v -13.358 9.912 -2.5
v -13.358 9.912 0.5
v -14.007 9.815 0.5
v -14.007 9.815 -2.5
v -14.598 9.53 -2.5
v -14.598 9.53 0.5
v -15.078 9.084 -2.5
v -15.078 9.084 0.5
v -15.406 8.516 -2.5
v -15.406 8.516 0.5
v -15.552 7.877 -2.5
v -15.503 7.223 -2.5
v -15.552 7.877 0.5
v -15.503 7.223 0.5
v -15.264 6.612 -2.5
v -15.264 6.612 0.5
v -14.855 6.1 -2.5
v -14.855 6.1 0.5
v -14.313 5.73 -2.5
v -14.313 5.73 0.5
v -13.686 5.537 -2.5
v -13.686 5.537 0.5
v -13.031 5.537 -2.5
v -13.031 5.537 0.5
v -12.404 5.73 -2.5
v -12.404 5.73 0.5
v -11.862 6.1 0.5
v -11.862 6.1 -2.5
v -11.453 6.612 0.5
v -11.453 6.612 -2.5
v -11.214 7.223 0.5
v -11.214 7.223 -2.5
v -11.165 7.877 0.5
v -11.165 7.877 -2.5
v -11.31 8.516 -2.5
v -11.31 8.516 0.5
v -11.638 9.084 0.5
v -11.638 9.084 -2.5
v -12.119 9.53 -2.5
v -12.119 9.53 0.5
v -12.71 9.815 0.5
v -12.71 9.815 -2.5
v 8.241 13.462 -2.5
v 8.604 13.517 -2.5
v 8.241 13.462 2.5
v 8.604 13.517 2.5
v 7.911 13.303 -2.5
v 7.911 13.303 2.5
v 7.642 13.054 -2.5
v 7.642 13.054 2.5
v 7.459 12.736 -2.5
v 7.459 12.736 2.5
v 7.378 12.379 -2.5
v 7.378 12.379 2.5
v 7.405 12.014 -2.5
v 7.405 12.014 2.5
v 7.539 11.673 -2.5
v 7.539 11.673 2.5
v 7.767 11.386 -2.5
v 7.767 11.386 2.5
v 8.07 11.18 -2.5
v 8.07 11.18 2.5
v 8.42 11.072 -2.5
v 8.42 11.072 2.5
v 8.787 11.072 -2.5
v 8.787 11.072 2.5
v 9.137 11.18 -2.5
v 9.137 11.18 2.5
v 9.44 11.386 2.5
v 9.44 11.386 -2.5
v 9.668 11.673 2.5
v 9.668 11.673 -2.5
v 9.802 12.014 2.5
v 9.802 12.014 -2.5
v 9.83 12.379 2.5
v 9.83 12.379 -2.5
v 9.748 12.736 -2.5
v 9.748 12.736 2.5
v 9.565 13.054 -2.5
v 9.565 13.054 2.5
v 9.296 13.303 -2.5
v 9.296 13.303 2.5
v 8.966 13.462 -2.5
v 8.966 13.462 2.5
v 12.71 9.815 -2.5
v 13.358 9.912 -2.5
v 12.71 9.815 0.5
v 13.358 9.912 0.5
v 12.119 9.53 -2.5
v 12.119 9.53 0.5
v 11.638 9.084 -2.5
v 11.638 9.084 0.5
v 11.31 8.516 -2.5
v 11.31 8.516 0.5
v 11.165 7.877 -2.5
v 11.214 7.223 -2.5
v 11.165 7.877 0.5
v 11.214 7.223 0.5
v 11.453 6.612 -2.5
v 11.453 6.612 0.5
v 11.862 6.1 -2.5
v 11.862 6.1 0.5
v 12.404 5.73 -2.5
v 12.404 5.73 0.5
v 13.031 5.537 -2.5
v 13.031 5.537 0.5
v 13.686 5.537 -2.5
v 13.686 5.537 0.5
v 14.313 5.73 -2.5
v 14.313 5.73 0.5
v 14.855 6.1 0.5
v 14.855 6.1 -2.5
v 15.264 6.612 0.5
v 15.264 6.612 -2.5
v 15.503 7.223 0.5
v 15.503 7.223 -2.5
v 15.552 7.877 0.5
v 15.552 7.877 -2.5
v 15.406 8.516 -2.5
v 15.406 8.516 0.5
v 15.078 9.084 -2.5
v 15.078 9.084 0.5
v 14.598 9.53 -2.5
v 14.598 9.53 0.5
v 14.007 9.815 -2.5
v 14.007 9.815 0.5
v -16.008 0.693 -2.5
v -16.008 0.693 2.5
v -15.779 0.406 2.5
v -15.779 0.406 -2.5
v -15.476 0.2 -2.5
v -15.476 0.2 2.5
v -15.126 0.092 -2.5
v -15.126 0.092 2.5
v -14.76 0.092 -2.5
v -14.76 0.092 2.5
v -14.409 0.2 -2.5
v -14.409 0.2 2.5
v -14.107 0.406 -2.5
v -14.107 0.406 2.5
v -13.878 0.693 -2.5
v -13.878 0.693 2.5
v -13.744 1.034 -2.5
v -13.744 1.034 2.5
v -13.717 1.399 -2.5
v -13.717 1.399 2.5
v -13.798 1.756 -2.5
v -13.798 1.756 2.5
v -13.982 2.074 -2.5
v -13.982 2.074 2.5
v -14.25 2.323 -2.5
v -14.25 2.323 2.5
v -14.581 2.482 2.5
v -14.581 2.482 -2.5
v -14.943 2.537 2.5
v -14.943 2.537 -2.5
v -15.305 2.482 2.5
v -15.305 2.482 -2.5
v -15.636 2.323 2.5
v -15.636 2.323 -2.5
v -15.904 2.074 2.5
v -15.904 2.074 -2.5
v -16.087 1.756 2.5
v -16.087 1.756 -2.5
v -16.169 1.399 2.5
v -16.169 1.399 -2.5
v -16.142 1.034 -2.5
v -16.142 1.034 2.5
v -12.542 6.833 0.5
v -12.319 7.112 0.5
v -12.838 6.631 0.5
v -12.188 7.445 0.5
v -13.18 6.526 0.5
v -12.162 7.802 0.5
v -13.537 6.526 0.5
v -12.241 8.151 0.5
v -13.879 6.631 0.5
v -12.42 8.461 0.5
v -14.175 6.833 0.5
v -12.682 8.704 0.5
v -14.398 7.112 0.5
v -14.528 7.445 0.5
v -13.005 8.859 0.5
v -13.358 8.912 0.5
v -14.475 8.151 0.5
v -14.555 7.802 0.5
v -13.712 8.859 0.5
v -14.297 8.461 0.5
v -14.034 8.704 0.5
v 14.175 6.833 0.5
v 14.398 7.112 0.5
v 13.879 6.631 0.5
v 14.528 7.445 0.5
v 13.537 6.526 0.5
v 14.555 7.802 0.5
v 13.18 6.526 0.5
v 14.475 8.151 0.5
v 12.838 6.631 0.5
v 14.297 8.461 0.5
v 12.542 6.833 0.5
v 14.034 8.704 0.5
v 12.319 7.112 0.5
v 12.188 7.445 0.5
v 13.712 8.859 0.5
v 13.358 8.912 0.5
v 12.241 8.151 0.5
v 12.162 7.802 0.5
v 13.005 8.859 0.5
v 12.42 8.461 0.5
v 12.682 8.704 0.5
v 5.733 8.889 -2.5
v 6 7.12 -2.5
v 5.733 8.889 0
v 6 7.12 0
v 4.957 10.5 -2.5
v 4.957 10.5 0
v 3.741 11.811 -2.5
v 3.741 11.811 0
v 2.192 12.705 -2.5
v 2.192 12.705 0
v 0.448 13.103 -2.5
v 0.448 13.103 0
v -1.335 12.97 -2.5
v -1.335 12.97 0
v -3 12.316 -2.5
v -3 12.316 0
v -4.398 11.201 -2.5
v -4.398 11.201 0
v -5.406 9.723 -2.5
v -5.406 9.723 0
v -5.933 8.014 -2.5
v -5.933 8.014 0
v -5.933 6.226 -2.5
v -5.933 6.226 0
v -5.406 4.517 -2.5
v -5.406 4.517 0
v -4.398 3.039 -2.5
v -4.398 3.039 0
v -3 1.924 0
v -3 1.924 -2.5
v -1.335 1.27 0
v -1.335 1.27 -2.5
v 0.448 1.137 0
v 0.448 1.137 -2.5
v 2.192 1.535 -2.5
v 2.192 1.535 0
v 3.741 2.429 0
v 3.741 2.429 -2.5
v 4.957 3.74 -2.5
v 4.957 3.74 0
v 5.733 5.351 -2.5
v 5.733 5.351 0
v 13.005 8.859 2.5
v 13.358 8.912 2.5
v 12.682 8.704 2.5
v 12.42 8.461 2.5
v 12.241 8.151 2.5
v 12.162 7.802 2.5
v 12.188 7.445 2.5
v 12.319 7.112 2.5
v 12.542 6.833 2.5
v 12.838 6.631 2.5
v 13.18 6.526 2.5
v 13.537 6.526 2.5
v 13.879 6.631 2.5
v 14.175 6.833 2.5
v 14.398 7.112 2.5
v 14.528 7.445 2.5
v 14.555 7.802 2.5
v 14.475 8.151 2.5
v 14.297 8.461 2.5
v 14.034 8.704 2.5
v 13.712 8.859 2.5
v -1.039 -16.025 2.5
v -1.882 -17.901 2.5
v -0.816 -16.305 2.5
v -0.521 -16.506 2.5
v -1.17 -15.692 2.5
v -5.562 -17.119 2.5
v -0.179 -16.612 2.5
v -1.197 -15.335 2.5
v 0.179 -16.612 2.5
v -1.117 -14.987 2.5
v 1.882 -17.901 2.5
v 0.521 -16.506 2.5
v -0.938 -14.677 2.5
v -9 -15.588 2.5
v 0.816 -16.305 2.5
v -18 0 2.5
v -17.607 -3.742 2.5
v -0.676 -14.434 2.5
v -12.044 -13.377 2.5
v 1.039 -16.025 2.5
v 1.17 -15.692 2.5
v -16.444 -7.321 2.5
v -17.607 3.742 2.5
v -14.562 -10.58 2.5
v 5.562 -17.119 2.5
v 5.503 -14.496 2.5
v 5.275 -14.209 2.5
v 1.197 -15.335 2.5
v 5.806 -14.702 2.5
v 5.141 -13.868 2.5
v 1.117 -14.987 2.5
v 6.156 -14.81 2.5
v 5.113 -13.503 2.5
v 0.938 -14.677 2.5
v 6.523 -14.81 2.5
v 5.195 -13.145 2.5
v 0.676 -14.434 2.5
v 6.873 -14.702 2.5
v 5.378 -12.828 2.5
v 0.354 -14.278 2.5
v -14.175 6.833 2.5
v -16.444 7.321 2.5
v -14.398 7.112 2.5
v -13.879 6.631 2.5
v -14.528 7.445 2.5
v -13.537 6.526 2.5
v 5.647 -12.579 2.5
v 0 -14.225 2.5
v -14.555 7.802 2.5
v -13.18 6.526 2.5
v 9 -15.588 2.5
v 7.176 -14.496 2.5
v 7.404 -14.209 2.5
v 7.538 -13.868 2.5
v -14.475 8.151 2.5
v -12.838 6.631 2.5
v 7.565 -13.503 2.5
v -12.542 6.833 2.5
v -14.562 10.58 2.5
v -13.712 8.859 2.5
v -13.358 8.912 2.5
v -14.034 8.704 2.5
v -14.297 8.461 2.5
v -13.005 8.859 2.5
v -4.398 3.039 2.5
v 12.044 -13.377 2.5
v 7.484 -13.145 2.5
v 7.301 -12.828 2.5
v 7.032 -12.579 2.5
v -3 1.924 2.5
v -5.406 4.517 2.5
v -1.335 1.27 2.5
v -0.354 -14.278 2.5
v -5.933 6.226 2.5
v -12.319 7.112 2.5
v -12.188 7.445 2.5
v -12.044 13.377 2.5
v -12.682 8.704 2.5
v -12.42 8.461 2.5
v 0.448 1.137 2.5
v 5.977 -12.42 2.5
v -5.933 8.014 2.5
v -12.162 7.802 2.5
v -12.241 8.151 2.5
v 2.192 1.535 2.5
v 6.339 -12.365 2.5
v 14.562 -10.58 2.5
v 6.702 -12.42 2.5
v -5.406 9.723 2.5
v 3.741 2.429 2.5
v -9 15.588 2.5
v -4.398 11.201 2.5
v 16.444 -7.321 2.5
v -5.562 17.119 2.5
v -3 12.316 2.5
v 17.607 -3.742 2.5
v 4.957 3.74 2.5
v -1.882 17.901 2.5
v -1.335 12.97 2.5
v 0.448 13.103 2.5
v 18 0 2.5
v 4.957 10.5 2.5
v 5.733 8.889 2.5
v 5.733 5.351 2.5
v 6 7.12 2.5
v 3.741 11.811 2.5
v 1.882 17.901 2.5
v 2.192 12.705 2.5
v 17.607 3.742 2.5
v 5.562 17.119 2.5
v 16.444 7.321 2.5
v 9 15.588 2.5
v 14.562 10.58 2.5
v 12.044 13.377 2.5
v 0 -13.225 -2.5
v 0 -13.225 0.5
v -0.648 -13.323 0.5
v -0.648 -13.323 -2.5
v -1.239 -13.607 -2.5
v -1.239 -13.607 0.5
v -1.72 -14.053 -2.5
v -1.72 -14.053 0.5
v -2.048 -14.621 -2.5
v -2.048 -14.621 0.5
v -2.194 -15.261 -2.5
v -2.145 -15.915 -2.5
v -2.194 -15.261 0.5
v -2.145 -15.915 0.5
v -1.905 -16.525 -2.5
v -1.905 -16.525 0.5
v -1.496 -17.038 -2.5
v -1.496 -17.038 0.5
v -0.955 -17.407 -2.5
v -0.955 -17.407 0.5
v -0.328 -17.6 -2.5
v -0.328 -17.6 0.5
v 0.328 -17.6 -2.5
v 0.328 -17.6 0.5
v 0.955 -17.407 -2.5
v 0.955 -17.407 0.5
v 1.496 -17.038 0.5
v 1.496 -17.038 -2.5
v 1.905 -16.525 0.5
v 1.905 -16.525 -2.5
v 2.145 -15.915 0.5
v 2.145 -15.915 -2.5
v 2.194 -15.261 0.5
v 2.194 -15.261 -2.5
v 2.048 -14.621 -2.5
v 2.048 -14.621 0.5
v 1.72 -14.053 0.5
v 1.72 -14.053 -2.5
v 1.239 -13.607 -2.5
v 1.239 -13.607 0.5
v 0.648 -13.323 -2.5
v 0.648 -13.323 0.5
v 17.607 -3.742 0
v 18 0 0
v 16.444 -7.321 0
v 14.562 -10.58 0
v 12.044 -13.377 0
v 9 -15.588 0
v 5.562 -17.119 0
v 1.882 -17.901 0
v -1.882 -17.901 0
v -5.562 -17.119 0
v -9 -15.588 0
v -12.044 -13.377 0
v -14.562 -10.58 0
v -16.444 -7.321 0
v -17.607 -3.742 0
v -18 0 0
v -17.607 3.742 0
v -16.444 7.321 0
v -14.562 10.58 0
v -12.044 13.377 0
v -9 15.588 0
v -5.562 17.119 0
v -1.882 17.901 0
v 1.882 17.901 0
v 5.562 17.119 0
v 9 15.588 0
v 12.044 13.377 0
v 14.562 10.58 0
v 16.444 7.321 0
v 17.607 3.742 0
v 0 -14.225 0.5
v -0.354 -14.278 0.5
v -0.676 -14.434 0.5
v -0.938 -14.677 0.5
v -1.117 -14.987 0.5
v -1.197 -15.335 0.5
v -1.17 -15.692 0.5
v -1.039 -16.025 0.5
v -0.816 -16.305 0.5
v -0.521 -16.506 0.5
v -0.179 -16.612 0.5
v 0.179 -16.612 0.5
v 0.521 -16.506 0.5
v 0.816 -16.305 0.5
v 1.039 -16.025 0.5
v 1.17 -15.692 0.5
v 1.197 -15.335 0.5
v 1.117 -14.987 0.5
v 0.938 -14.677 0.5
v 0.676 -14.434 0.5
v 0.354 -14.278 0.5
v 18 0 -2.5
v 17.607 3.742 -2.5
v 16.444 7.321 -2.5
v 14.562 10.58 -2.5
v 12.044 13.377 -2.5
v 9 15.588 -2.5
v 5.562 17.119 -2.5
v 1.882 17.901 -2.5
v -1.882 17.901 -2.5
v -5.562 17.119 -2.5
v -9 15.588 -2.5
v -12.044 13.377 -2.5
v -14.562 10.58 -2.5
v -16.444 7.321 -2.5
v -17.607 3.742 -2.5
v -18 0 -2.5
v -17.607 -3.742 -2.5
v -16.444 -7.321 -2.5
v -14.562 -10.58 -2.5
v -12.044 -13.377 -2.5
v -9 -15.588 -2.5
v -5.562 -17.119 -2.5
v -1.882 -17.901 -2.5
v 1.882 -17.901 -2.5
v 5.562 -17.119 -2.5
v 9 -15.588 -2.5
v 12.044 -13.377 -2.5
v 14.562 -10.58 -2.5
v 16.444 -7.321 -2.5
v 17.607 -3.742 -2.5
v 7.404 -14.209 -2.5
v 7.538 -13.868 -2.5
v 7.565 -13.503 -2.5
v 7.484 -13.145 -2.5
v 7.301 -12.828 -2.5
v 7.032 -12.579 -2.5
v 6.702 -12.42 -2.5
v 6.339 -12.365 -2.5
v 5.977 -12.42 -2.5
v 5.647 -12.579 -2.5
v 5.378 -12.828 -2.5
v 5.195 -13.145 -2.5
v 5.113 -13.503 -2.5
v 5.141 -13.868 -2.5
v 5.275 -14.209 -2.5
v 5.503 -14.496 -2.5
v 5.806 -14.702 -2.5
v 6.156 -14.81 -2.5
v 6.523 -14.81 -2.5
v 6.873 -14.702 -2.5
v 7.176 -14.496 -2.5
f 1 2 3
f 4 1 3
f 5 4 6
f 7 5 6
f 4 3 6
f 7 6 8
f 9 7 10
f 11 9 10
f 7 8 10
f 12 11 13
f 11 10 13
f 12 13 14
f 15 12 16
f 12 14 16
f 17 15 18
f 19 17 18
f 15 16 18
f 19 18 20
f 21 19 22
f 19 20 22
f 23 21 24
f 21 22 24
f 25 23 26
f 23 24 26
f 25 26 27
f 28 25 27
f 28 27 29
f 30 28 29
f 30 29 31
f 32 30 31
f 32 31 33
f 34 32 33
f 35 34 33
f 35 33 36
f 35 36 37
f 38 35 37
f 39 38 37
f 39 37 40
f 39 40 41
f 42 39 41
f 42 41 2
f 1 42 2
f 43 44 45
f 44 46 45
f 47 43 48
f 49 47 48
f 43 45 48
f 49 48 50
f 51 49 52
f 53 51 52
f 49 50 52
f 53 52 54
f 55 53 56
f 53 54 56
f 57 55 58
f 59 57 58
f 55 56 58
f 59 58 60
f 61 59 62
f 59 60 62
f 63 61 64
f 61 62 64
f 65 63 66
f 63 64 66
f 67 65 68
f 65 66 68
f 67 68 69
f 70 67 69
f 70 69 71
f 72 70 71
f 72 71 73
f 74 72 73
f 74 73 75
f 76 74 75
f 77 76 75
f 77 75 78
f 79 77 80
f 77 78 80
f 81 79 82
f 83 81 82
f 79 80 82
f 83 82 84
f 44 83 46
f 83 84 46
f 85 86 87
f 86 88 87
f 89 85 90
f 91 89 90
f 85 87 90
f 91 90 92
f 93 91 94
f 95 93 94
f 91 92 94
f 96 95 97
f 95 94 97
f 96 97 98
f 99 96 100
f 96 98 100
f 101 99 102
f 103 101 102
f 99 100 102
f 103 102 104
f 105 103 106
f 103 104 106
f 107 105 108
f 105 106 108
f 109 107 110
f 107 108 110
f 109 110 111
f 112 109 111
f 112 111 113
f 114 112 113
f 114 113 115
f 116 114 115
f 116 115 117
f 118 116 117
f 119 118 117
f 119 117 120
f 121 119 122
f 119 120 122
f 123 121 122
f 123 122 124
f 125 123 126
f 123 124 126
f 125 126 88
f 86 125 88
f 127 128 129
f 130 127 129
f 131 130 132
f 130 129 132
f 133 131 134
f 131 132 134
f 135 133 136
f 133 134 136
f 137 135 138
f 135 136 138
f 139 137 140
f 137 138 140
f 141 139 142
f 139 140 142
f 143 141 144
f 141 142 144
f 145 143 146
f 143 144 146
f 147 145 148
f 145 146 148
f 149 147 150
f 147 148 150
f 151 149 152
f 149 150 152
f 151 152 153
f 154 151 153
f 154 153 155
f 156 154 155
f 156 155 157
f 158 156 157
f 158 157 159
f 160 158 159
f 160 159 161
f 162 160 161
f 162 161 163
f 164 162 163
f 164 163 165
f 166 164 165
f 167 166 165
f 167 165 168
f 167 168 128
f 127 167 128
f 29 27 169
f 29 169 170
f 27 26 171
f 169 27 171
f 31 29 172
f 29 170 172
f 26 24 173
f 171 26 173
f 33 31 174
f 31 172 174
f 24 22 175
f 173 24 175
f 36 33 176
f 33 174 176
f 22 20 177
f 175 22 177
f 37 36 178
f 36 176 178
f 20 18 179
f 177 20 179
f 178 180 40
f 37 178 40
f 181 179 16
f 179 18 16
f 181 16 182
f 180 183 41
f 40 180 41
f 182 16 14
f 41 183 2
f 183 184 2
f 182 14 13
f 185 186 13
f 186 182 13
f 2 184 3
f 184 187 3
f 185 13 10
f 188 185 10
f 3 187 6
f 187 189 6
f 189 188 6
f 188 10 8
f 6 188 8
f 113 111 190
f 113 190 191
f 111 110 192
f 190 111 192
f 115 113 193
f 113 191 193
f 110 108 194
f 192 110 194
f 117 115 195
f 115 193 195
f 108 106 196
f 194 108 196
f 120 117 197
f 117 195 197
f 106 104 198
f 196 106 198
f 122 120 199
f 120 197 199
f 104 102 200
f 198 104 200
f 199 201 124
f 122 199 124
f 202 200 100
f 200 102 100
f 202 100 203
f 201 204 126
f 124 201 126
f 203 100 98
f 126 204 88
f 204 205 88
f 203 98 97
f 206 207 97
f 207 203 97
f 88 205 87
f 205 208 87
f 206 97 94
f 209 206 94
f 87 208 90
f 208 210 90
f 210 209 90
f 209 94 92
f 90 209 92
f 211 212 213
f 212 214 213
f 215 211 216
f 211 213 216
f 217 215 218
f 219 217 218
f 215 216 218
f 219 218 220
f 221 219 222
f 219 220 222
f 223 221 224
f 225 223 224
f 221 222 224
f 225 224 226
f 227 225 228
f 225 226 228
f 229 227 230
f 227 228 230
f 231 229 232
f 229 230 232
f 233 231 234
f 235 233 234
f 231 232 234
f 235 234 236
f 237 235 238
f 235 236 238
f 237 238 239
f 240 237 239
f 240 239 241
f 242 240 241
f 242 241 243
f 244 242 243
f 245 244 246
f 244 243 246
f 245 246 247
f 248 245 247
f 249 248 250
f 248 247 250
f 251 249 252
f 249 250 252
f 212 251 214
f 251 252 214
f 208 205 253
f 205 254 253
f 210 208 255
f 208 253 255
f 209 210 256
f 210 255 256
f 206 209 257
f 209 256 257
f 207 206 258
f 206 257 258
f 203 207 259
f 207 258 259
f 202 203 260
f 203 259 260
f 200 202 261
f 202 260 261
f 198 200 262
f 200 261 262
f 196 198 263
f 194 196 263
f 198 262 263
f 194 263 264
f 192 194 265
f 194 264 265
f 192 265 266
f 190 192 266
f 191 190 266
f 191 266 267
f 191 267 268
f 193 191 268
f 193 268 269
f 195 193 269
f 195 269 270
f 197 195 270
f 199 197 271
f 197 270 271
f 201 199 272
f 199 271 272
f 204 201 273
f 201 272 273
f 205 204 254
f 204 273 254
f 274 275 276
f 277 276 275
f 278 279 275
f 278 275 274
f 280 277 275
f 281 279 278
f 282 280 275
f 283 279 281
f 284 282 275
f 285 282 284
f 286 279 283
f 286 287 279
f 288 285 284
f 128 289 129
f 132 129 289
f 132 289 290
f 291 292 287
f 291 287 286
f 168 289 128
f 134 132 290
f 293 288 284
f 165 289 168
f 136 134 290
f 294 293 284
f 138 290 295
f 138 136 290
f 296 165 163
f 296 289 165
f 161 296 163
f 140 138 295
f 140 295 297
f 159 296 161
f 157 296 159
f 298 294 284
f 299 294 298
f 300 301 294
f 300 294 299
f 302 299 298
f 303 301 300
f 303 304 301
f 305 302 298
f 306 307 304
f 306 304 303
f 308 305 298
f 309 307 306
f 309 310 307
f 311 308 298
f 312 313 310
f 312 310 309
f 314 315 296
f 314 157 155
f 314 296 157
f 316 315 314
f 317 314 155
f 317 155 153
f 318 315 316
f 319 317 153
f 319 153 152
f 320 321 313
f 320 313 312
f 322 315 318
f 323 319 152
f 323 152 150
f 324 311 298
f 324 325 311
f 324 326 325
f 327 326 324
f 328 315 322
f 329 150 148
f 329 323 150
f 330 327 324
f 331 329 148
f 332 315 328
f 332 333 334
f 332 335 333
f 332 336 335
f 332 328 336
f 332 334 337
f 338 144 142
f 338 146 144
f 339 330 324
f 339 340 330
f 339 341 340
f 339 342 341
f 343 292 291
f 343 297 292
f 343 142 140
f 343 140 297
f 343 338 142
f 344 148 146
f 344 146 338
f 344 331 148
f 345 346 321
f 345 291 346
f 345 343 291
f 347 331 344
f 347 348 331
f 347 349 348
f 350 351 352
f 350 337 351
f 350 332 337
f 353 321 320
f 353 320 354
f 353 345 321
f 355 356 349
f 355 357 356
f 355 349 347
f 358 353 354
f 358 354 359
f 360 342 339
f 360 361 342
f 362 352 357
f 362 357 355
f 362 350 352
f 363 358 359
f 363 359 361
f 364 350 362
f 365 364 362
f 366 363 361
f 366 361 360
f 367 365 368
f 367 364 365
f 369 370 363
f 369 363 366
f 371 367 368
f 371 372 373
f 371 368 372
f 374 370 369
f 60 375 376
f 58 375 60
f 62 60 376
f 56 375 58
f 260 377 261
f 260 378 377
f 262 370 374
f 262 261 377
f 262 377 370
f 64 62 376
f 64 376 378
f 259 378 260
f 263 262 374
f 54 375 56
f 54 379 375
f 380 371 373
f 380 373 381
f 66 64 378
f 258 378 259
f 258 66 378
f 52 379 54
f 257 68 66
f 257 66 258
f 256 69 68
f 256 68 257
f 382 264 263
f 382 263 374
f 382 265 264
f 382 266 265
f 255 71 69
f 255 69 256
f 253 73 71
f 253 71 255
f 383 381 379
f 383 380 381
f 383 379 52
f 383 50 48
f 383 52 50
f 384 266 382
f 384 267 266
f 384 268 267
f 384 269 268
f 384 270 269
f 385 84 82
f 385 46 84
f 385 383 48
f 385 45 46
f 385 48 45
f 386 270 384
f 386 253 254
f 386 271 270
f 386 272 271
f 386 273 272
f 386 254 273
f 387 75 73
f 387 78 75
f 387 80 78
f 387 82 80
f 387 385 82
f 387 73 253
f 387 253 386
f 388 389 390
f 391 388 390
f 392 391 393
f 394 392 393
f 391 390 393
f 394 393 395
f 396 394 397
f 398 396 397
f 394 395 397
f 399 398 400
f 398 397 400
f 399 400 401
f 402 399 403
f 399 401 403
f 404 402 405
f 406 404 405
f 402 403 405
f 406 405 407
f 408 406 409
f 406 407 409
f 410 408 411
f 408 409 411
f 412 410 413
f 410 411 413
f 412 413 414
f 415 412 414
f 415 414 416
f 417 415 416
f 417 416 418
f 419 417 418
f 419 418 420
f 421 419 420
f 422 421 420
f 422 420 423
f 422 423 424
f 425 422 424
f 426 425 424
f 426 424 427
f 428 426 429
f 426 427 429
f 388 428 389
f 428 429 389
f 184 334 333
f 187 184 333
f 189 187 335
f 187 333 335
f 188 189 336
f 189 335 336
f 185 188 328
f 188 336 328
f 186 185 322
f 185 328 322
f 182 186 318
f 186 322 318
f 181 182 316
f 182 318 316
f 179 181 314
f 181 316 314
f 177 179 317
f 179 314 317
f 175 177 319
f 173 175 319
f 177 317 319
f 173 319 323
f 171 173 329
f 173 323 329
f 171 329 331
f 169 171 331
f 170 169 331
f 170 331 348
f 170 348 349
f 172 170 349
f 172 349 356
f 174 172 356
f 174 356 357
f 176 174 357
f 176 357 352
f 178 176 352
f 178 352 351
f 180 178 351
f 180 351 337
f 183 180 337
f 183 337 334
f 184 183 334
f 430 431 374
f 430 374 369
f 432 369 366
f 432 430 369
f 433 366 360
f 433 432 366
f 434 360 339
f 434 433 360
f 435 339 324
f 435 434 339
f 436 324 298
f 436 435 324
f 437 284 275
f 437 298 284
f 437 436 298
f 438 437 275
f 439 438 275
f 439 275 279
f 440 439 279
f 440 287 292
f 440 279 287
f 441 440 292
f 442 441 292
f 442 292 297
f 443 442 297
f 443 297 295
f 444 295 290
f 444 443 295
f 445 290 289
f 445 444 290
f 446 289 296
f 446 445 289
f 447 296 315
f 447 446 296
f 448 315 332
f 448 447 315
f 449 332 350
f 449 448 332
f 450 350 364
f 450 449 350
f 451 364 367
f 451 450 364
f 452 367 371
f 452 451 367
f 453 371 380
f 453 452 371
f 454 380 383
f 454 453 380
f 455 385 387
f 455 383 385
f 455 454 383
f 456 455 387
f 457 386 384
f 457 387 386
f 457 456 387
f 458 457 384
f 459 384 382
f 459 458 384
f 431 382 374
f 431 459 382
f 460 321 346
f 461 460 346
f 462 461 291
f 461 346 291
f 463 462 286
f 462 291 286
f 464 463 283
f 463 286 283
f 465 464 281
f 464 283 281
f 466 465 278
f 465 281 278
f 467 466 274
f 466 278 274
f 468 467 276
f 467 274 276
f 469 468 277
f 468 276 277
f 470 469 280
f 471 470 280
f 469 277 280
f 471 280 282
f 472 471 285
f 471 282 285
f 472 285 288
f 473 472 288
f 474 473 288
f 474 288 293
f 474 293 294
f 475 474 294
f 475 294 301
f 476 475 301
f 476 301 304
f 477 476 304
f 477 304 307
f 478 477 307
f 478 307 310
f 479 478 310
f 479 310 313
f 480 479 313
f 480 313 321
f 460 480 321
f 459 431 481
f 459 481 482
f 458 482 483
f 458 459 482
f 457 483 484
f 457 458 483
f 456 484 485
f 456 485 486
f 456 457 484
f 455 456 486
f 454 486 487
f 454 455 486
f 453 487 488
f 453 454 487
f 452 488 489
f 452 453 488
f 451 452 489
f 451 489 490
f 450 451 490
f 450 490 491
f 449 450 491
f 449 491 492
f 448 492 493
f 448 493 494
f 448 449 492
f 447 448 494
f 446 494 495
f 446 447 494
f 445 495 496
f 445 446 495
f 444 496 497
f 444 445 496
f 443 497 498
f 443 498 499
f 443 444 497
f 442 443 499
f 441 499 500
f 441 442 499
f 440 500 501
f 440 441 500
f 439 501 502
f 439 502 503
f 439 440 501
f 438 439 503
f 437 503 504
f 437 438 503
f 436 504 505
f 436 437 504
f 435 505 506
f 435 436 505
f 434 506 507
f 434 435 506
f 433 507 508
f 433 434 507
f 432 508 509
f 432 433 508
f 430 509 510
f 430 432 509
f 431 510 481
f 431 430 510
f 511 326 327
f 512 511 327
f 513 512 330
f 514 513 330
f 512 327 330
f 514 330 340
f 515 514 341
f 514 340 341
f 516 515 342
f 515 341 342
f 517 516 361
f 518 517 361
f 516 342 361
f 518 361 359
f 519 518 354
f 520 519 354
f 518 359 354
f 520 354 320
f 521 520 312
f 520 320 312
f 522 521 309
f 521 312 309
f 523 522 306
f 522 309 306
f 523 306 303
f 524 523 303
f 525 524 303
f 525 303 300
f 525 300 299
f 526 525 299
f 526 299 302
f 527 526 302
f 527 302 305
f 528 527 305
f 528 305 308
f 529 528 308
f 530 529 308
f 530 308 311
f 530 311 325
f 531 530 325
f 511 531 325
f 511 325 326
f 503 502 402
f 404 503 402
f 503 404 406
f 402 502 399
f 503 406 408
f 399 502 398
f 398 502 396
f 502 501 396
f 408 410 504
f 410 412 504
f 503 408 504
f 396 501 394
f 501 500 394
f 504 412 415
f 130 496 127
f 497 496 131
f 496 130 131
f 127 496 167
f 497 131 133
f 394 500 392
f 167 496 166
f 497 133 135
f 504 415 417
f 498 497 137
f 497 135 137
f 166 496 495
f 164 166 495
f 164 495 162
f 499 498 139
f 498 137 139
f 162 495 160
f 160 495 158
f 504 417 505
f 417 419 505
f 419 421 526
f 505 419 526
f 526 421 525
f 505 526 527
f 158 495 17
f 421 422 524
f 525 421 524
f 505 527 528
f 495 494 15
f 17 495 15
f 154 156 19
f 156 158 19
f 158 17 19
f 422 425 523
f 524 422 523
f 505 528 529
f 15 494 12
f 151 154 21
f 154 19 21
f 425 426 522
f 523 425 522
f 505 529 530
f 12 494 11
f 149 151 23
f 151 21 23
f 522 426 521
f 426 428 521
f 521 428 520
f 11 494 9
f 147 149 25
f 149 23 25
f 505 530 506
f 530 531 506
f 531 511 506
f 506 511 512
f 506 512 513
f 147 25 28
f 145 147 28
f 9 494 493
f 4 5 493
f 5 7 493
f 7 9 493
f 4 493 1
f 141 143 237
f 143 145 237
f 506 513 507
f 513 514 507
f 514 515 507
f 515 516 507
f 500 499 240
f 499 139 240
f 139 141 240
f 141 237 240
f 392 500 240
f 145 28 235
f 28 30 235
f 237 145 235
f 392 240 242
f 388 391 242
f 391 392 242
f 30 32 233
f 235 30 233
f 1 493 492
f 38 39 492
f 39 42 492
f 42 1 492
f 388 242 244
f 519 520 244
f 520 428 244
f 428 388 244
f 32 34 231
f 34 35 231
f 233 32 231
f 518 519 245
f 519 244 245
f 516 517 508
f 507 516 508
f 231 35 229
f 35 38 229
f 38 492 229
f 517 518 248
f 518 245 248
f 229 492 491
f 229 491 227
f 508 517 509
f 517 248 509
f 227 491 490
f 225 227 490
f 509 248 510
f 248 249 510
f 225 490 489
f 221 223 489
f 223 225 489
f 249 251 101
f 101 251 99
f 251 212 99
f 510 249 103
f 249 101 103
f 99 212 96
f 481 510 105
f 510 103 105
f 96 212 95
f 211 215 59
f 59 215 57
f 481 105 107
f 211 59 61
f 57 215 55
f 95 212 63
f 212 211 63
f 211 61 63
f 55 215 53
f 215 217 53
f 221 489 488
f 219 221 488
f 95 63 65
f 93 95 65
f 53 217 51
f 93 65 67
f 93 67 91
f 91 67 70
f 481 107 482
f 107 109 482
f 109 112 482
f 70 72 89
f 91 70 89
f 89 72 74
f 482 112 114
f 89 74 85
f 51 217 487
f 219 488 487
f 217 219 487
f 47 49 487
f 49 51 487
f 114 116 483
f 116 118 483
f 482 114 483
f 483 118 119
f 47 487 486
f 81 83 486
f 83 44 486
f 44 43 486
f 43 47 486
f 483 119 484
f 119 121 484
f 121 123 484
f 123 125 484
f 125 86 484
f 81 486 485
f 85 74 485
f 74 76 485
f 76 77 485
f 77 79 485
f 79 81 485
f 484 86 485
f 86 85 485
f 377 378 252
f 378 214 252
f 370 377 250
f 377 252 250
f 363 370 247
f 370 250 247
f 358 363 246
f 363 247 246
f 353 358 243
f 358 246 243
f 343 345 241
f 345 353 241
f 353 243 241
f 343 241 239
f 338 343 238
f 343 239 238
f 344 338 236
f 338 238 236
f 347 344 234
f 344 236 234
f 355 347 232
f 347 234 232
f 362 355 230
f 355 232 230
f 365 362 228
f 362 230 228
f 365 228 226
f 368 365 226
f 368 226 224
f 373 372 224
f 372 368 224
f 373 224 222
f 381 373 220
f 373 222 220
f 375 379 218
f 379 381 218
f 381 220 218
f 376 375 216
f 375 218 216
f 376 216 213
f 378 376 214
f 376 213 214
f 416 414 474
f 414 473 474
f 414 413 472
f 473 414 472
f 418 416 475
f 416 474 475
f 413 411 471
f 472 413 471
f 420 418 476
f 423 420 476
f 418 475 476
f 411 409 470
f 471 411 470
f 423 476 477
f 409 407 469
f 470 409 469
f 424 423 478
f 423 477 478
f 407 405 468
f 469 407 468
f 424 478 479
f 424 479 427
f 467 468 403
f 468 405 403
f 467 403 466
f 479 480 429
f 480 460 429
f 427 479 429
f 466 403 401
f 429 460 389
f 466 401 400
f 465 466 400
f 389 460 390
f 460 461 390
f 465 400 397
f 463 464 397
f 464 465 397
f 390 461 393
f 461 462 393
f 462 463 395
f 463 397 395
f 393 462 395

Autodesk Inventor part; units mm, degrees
ref_plane "YZ Plane" through (0, 0, 0) normal (1, 0, 0) x (0, 1, 0)
ref_plane "XZ Plane" through (0, 0, 0) normal (0, 1, 0) x (-1, 0, 0)
ref_plane "XY Plane" through (0, 0, 0) normal (0, 0, 1) x (1, 0, 0)
sketch "Sketch1" plane through (0, 0, 0) normal (0, 0, 1) x (1, 0, 0)
  circle A0 centre (0, 0) radius 18
  circle A1 centre (0, 7.12) radius 6
  line L0 (0, 0) -> (0, 7.12) construction
  dimension "d0" = 36
  dimension "d1" = 12
  dimension "d2" = 7.12
extrude "Extrusion1" add sketch "Sketch1" along normal mid plane 5
sketch "Sketch2" plane through (0, 0, -2.5) normal (0, 0, -1) x (-1, 0, 0)
  circle A0 centre (0, 0) radius 15.425 construction
  circle A1 centre (0, 7.12) radius 6 construction
  line L0 (0, 7.12) -> (0, 7.7125) construction
  point P0 (0, -15.425)
  point P1 (13.3584, 7.7125)
  point P2 (-13.3584, 7.7125)
  dimension "d11" = 360
hole "Hole1" at (0, -15.425, -2.5) at (-13.3584, 7.7125, -2.5) at (13.3584, 7.7125, -2.5) direction (0, 0, 1) diameter 2.4 end through all counterbore diameter 4.4 counterbore depth 3
sketch "Sketch3" plane through (0, 0, -2.5) normal (0, 0, -1) x (-1, 0, 0)
  circle A0 centre (-13.3584, 7.7125) radius 2.2 construction
  circle A1 centre (-13.3584, 7.7125) radius 1.2 construction
  line L0 (-13.3584, 7.7125) -> (0, 0) construction
  line L1 (0, 0) -> (-9.6467, 13.7769) construction
  circle A2 centre (0, 0) radius 15.425 construction
  circle A3 centre (0, 7.12) radius 6 construction
  line L2 (0, 0) -> (0, 7.12) construction
  point P0 (-8.6036, 12.2873)
  dimension "d37" = 30.85
  dimension "d20" = 25
  dimension "d21" = 15
  dimension "d38" = 60
  dimension "d39" = 7.12
hole "Hole2" at (8.6036, 12.2873, -2.5) direction (0, 0, 1) diameter 2.459 end through all thread size "M3x0.5" class "6H" standard "ISO Metric profile"
pattern_circular "Circular Pattern1" count 3 over 360 about axis through (0, 0, 0) along (0, 0, 1) of "Hole2"
properties part number "P21" material "Aluminium"
